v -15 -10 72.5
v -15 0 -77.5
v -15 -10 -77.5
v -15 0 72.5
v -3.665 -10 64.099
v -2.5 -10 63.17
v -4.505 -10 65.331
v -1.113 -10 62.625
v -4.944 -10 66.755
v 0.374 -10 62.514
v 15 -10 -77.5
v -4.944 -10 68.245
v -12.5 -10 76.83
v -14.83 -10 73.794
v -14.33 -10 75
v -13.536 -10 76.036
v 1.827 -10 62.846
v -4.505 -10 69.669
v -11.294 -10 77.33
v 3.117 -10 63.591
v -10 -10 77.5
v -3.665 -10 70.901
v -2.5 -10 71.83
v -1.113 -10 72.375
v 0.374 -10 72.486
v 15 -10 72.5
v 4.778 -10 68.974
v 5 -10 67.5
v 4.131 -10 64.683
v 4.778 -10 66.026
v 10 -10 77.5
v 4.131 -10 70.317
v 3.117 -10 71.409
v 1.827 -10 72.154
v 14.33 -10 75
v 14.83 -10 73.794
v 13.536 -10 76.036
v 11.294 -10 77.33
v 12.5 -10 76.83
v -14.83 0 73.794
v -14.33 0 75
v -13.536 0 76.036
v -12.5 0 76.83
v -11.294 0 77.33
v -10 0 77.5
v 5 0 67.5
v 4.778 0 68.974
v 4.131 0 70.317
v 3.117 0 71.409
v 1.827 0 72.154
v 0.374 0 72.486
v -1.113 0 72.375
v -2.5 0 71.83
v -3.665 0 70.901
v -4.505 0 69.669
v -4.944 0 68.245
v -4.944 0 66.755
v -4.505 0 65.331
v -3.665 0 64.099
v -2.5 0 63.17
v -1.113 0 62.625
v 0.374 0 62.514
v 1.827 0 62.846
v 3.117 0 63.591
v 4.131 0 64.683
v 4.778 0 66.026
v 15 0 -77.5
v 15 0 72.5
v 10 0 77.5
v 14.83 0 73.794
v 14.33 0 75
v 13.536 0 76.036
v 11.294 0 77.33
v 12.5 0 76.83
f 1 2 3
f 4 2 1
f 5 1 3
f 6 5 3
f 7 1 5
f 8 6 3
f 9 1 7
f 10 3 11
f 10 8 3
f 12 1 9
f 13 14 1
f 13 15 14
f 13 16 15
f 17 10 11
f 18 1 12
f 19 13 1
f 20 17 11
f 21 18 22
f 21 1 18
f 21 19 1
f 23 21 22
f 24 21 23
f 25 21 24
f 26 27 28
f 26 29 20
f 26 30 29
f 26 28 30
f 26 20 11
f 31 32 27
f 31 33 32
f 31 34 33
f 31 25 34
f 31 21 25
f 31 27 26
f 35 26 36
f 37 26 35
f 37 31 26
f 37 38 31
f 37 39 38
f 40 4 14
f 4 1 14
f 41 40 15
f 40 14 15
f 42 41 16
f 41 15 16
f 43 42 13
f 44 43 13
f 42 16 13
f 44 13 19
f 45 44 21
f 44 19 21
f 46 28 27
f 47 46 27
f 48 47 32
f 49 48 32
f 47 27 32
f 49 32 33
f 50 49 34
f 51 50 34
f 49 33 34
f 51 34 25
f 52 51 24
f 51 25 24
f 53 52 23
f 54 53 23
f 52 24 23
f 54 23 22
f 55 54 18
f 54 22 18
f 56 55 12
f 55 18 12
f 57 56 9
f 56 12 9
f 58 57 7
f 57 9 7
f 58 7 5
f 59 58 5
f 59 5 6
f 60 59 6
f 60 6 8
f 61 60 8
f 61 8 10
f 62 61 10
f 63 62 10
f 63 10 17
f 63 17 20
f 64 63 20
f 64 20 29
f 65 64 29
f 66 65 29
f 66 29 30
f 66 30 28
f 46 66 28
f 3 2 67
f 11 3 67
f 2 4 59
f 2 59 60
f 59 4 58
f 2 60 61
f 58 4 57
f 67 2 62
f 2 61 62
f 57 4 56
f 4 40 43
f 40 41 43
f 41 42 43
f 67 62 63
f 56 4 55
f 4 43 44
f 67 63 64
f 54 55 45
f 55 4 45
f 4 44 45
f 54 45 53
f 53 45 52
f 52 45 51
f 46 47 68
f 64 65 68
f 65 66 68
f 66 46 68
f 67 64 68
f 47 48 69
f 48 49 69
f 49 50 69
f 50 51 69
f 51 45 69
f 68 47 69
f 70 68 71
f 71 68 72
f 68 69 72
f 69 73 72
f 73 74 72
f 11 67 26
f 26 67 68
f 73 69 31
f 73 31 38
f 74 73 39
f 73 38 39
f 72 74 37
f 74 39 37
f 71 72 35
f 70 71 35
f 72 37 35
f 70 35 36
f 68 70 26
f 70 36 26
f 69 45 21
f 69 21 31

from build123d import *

# Parameters (mm, degrees)
F0_W     = 30
F0_H     = 155
F1_DEPTH = 10
F2_R     = 5
F3_DEPTH = 10.001
F4_R     = 5


# Not quite as in the source:
# - a feature names something its author has since deleted; it is built from what else it names


with BuildPart() as f1:
    # F0 (on Front) → F1 (new body)
    with BuildSketch(Plane.XZ):
        Rectangle(F0_W, F0_H)
    extrude(amount=F1_DEPTH)

    # F2 (on face) → F3 (cut, through all)
    with BuildSketch(Plane.XZ.offset(10)):
        with Locations((0, 67.5)):
            Circle(F2_R)
    extrude(amount=-F3_DEPTH, mode=Mode.SUBTRACT)

    # F4
    f4_edges = [f1.edges().sort_by_distance(p)[0] for p in [
        (15, -5, 77.5),
        (-15, -5, 77.5),
    ]]
    fillet(f4_edges, radius=F4_R)


solid = f1.part
